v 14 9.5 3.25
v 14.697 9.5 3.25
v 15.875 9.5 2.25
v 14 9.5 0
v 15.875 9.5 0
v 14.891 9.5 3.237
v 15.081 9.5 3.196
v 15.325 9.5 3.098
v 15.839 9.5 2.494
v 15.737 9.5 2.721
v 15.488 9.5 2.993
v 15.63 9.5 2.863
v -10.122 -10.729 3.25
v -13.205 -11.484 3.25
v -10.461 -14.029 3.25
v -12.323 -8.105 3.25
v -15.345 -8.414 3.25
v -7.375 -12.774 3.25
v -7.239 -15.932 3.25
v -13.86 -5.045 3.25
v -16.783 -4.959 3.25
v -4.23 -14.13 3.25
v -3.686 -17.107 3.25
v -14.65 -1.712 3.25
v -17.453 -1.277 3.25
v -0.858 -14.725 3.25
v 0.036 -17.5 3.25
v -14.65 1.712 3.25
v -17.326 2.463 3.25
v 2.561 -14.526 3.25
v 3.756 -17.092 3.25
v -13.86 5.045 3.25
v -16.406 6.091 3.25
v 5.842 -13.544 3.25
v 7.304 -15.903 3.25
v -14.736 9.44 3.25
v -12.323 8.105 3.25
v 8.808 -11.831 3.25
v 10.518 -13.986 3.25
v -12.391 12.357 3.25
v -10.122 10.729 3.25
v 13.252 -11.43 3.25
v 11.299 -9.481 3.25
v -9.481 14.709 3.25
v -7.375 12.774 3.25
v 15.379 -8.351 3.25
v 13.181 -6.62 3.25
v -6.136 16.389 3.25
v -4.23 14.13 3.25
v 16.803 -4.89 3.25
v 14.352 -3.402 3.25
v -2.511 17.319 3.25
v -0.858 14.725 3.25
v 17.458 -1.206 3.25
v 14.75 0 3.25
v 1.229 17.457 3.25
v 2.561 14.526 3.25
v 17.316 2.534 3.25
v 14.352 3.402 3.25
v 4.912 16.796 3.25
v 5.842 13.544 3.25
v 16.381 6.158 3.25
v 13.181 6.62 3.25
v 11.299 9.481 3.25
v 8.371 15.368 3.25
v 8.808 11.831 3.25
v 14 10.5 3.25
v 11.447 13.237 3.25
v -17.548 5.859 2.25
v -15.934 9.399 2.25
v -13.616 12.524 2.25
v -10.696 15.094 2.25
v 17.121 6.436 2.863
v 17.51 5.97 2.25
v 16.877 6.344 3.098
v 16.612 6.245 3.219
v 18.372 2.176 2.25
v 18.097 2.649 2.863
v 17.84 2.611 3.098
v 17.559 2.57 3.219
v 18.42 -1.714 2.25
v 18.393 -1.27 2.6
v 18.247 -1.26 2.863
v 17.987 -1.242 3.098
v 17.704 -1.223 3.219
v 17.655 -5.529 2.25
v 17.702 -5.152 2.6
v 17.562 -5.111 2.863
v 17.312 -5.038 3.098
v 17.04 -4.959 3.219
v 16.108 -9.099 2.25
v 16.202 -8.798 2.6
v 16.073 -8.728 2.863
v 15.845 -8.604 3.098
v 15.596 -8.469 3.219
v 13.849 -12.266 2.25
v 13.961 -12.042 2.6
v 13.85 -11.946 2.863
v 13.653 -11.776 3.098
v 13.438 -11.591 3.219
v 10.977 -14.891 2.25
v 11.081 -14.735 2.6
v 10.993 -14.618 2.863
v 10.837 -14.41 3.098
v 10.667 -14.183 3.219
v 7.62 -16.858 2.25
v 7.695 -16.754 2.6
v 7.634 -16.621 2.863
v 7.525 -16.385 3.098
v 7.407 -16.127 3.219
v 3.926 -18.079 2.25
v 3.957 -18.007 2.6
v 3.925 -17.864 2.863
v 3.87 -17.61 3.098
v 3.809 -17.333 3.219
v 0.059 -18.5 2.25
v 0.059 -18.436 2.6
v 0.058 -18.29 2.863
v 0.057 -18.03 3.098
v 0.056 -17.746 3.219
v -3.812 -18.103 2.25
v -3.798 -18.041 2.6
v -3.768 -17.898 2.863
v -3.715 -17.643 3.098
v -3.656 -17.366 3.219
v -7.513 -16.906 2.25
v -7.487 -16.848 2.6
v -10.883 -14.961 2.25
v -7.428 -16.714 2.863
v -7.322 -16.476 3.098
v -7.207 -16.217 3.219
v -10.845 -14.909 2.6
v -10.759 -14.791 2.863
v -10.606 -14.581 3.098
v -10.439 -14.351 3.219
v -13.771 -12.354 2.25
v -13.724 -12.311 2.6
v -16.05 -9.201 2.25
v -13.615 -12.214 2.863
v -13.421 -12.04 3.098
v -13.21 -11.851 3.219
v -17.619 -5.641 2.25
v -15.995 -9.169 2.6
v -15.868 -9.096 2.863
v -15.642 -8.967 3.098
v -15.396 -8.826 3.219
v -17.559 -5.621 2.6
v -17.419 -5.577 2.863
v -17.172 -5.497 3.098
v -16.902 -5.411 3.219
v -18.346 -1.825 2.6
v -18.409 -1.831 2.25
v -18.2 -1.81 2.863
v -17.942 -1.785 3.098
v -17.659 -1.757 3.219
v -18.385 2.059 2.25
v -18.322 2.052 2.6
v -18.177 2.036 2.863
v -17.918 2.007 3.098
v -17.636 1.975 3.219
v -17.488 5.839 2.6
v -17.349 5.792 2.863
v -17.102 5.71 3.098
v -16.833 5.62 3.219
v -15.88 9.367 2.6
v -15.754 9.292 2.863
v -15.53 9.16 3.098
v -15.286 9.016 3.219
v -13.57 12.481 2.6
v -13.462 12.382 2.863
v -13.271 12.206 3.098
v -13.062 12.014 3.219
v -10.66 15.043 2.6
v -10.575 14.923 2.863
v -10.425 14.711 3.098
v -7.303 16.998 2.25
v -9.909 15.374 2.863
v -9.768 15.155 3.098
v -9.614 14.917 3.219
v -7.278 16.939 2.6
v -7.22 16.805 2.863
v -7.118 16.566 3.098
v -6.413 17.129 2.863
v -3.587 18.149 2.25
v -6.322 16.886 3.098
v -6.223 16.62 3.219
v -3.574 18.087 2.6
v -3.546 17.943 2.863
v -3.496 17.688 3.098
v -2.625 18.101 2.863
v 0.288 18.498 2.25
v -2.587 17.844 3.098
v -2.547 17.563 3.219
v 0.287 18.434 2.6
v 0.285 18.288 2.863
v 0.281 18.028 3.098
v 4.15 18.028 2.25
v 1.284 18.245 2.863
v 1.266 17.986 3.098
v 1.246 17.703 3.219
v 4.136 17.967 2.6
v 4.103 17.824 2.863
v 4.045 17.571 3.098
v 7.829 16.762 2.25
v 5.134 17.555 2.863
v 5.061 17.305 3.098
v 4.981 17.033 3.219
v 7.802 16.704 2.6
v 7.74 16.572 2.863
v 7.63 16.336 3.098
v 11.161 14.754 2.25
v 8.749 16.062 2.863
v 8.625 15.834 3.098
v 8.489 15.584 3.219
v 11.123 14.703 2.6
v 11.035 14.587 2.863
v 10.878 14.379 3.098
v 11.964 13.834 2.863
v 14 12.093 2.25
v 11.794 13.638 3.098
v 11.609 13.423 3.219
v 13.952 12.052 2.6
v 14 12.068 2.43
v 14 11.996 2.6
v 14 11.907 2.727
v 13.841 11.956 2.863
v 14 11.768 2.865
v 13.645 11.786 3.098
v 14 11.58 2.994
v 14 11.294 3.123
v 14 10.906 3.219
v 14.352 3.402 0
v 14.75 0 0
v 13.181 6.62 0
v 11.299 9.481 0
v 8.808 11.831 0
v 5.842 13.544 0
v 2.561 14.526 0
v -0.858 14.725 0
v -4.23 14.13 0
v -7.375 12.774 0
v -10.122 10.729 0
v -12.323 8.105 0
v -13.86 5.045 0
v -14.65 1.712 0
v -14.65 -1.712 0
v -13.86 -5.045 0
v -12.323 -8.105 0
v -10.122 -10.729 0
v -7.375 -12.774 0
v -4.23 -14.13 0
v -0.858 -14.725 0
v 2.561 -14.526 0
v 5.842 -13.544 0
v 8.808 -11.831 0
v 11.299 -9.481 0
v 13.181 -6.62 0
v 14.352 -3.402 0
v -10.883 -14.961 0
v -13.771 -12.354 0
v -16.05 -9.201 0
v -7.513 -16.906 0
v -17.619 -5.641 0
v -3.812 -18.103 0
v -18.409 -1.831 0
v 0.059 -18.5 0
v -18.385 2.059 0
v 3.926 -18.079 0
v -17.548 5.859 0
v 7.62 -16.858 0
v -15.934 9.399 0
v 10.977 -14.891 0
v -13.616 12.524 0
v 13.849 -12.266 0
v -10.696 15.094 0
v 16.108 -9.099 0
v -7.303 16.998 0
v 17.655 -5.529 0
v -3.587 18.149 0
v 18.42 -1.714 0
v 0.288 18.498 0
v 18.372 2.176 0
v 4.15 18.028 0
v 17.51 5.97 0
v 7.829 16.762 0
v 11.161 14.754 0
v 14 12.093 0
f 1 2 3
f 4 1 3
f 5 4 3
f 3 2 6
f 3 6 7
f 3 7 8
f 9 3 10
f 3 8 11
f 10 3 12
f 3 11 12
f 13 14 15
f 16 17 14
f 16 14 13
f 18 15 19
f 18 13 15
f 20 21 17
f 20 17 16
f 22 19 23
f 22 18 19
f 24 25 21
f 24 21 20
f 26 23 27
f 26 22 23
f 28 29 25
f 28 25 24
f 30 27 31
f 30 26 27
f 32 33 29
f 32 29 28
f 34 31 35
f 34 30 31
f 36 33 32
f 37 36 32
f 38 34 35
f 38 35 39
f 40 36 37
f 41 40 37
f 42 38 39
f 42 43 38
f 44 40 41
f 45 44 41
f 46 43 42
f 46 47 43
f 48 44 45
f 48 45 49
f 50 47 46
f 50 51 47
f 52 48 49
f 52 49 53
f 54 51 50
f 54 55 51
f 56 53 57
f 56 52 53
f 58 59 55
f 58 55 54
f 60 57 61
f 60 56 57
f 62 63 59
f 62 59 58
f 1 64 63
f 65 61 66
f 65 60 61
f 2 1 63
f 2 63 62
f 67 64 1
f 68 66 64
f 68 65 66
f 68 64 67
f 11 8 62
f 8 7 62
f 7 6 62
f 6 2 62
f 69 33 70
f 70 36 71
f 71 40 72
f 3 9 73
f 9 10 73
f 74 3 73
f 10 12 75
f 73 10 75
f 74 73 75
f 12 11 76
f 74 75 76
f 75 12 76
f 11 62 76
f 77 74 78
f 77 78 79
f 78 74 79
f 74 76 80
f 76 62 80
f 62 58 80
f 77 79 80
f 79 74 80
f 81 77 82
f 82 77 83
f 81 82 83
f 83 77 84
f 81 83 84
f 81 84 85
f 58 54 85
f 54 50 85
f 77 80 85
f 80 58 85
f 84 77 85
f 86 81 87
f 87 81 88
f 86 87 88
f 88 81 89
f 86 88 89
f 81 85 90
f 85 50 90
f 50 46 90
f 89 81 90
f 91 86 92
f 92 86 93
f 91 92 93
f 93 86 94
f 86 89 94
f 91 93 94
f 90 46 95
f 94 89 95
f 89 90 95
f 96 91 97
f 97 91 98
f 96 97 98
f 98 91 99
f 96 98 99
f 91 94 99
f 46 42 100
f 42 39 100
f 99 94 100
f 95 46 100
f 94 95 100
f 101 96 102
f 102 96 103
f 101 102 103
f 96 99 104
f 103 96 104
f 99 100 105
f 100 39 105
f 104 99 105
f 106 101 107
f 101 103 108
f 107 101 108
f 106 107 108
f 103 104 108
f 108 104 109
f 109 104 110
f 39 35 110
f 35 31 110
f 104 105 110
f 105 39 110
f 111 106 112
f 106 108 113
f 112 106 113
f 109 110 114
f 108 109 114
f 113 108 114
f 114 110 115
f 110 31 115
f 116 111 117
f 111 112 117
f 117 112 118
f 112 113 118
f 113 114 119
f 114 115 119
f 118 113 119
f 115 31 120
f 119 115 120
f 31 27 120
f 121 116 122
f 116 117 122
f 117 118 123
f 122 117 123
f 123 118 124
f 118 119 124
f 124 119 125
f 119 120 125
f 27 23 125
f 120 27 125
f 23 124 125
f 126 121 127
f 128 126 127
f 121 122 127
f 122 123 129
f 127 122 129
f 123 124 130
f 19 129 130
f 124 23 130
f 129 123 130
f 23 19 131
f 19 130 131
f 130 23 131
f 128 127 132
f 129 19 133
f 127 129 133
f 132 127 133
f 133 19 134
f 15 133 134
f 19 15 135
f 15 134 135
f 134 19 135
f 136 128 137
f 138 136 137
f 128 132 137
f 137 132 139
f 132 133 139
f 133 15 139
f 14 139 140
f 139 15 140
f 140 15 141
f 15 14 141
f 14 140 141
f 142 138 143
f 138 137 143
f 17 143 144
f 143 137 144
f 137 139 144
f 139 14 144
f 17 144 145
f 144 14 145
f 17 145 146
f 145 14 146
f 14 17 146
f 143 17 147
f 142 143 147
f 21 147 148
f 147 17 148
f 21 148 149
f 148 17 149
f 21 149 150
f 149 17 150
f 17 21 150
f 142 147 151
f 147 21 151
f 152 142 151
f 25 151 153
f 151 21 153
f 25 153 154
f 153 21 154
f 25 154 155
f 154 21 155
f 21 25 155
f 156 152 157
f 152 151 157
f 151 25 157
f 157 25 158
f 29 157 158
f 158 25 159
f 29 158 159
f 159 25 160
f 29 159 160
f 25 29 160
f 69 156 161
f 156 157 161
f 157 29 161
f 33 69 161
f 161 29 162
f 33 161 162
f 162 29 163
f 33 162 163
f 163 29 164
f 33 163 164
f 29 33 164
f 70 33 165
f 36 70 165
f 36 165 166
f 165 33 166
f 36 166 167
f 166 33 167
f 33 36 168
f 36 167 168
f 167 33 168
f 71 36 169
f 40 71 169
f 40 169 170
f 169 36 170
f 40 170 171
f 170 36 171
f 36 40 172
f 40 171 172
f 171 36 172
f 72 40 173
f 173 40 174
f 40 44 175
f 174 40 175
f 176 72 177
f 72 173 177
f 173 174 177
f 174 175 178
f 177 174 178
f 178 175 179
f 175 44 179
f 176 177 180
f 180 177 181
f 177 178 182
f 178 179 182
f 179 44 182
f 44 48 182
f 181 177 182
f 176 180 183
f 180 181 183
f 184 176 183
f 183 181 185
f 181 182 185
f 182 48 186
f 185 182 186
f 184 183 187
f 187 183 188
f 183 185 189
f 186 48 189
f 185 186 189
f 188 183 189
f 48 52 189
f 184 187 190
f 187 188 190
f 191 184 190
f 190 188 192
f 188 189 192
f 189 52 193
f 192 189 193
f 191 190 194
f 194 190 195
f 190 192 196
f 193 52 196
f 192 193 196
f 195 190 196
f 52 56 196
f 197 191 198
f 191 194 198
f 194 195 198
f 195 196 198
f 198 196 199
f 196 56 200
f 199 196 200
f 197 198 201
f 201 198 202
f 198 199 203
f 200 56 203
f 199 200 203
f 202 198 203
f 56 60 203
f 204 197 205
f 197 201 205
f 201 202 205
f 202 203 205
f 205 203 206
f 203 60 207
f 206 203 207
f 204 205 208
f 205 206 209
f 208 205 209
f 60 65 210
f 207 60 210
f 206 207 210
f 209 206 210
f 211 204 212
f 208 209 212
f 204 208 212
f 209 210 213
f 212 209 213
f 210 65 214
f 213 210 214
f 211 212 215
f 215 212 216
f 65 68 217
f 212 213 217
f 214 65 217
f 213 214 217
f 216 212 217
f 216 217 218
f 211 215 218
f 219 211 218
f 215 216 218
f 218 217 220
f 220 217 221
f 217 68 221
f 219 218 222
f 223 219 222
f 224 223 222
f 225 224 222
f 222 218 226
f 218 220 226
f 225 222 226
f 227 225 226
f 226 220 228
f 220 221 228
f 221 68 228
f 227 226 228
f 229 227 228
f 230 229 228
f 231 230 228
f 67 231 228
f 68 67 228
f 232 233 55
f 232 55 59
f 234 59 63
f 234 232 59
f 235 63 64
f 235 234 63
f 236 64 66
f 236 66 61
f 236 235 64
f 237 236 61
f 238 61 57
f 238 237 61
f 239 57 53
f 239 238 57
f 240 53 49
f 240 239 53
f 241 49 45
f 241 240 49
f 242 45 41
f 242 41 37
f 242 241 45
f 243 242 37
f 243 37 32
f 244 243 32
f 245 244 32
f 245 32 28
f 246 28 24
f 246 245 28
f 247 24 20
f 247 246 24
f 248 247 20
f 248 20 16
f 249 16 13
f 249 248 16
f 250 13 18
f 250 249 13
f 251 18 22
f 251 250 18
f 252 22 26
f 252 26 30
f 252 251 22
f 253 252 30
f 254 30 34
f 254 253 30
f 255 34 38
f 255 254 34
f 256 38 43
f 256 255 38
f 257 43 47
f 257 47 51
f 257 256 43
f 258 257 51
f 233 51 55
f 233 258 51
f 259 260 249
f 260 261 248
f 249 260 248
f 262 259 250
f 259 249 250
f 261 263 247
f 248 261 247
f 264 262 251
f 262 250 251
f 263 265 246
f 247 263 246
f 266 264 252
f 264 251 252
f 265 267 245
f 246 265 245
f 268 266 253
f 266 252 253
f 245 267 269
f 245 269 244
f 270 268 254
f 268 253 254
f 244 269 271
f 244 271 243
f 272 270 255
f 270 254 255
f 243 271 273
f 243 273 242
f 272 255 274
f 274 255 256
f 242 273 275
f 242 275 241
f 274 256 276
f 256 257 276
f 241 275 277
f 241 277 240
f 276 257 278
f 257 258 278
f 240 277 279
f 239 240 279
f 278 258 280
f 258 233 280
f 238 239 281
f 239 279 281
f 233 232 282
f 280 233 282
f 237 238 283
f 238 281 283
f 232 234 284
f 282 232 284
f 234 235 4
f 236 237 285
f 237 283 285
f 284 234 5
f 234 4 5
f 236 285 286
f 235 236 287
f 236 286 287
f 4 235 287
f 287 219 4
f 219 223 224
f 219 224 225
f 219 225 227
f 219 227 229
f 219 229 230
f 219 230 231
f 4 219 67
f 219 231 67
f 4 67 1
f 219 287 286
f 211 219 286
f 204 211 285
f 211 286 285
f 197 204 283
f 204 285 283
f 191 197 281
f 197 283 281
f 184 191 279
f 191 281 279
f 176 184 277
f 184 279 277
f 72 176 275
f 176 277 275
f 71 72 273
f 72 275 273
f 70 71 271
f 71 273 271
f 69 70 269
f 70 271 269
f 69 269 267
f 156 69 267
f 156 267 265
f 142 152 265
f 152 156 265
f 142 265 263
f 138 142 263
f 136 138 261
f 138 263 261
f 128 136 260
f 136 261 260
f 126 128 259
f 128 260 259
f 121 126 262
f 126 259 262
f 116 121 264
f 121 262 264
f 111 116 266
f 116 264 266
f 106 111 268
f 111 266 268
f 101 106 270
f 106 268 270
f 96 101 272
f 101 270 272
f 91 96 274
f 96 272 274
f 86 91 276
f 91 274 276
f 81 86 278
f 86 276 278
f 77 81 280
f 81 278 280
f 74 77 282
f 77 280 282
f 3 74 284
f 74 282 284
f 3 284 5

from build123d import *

# Parameters (mm, degrees)
F0_R     = 18.5
F0_R_2   = 14.75
F1_DEPTH = 3.25
F3_DEPTH = 25
F4_R     = 1


with BuildPart() as f1:
    # F0 (on Top) → F1 (new body)
    with BuildSketch(Plane.XY):
        Circle(F0_R)
        Circle(F0_R_2, mode=Mode.SUBTRACT)
    extrude(amount=F1_DEPTH)

    # F2 (on face) → F3 (cut)
    with BuildSketch(Plane.XY.offset(3.25)):
        with BuildLine():
            Line((14, 9.5), (15.874508, 9.5))
            ThreePointArc((15.874508, 9.5), (14.993431, 10.837298), (14, 12.093387))
            Line((14, 12.093387), (14, 9.5))
        make_face()
    extrude(amount=-F3_DEPTH, mode=Mode.SUBTRACT)

    # F4
    f4_edges = [f1.edges().sort_by_distance(p)[0] for p in [
        (-14.993431, -10.837298, 3.25),
    ]]
    fillet(f4_edges, radius=F4_R)


solid = f1.part
